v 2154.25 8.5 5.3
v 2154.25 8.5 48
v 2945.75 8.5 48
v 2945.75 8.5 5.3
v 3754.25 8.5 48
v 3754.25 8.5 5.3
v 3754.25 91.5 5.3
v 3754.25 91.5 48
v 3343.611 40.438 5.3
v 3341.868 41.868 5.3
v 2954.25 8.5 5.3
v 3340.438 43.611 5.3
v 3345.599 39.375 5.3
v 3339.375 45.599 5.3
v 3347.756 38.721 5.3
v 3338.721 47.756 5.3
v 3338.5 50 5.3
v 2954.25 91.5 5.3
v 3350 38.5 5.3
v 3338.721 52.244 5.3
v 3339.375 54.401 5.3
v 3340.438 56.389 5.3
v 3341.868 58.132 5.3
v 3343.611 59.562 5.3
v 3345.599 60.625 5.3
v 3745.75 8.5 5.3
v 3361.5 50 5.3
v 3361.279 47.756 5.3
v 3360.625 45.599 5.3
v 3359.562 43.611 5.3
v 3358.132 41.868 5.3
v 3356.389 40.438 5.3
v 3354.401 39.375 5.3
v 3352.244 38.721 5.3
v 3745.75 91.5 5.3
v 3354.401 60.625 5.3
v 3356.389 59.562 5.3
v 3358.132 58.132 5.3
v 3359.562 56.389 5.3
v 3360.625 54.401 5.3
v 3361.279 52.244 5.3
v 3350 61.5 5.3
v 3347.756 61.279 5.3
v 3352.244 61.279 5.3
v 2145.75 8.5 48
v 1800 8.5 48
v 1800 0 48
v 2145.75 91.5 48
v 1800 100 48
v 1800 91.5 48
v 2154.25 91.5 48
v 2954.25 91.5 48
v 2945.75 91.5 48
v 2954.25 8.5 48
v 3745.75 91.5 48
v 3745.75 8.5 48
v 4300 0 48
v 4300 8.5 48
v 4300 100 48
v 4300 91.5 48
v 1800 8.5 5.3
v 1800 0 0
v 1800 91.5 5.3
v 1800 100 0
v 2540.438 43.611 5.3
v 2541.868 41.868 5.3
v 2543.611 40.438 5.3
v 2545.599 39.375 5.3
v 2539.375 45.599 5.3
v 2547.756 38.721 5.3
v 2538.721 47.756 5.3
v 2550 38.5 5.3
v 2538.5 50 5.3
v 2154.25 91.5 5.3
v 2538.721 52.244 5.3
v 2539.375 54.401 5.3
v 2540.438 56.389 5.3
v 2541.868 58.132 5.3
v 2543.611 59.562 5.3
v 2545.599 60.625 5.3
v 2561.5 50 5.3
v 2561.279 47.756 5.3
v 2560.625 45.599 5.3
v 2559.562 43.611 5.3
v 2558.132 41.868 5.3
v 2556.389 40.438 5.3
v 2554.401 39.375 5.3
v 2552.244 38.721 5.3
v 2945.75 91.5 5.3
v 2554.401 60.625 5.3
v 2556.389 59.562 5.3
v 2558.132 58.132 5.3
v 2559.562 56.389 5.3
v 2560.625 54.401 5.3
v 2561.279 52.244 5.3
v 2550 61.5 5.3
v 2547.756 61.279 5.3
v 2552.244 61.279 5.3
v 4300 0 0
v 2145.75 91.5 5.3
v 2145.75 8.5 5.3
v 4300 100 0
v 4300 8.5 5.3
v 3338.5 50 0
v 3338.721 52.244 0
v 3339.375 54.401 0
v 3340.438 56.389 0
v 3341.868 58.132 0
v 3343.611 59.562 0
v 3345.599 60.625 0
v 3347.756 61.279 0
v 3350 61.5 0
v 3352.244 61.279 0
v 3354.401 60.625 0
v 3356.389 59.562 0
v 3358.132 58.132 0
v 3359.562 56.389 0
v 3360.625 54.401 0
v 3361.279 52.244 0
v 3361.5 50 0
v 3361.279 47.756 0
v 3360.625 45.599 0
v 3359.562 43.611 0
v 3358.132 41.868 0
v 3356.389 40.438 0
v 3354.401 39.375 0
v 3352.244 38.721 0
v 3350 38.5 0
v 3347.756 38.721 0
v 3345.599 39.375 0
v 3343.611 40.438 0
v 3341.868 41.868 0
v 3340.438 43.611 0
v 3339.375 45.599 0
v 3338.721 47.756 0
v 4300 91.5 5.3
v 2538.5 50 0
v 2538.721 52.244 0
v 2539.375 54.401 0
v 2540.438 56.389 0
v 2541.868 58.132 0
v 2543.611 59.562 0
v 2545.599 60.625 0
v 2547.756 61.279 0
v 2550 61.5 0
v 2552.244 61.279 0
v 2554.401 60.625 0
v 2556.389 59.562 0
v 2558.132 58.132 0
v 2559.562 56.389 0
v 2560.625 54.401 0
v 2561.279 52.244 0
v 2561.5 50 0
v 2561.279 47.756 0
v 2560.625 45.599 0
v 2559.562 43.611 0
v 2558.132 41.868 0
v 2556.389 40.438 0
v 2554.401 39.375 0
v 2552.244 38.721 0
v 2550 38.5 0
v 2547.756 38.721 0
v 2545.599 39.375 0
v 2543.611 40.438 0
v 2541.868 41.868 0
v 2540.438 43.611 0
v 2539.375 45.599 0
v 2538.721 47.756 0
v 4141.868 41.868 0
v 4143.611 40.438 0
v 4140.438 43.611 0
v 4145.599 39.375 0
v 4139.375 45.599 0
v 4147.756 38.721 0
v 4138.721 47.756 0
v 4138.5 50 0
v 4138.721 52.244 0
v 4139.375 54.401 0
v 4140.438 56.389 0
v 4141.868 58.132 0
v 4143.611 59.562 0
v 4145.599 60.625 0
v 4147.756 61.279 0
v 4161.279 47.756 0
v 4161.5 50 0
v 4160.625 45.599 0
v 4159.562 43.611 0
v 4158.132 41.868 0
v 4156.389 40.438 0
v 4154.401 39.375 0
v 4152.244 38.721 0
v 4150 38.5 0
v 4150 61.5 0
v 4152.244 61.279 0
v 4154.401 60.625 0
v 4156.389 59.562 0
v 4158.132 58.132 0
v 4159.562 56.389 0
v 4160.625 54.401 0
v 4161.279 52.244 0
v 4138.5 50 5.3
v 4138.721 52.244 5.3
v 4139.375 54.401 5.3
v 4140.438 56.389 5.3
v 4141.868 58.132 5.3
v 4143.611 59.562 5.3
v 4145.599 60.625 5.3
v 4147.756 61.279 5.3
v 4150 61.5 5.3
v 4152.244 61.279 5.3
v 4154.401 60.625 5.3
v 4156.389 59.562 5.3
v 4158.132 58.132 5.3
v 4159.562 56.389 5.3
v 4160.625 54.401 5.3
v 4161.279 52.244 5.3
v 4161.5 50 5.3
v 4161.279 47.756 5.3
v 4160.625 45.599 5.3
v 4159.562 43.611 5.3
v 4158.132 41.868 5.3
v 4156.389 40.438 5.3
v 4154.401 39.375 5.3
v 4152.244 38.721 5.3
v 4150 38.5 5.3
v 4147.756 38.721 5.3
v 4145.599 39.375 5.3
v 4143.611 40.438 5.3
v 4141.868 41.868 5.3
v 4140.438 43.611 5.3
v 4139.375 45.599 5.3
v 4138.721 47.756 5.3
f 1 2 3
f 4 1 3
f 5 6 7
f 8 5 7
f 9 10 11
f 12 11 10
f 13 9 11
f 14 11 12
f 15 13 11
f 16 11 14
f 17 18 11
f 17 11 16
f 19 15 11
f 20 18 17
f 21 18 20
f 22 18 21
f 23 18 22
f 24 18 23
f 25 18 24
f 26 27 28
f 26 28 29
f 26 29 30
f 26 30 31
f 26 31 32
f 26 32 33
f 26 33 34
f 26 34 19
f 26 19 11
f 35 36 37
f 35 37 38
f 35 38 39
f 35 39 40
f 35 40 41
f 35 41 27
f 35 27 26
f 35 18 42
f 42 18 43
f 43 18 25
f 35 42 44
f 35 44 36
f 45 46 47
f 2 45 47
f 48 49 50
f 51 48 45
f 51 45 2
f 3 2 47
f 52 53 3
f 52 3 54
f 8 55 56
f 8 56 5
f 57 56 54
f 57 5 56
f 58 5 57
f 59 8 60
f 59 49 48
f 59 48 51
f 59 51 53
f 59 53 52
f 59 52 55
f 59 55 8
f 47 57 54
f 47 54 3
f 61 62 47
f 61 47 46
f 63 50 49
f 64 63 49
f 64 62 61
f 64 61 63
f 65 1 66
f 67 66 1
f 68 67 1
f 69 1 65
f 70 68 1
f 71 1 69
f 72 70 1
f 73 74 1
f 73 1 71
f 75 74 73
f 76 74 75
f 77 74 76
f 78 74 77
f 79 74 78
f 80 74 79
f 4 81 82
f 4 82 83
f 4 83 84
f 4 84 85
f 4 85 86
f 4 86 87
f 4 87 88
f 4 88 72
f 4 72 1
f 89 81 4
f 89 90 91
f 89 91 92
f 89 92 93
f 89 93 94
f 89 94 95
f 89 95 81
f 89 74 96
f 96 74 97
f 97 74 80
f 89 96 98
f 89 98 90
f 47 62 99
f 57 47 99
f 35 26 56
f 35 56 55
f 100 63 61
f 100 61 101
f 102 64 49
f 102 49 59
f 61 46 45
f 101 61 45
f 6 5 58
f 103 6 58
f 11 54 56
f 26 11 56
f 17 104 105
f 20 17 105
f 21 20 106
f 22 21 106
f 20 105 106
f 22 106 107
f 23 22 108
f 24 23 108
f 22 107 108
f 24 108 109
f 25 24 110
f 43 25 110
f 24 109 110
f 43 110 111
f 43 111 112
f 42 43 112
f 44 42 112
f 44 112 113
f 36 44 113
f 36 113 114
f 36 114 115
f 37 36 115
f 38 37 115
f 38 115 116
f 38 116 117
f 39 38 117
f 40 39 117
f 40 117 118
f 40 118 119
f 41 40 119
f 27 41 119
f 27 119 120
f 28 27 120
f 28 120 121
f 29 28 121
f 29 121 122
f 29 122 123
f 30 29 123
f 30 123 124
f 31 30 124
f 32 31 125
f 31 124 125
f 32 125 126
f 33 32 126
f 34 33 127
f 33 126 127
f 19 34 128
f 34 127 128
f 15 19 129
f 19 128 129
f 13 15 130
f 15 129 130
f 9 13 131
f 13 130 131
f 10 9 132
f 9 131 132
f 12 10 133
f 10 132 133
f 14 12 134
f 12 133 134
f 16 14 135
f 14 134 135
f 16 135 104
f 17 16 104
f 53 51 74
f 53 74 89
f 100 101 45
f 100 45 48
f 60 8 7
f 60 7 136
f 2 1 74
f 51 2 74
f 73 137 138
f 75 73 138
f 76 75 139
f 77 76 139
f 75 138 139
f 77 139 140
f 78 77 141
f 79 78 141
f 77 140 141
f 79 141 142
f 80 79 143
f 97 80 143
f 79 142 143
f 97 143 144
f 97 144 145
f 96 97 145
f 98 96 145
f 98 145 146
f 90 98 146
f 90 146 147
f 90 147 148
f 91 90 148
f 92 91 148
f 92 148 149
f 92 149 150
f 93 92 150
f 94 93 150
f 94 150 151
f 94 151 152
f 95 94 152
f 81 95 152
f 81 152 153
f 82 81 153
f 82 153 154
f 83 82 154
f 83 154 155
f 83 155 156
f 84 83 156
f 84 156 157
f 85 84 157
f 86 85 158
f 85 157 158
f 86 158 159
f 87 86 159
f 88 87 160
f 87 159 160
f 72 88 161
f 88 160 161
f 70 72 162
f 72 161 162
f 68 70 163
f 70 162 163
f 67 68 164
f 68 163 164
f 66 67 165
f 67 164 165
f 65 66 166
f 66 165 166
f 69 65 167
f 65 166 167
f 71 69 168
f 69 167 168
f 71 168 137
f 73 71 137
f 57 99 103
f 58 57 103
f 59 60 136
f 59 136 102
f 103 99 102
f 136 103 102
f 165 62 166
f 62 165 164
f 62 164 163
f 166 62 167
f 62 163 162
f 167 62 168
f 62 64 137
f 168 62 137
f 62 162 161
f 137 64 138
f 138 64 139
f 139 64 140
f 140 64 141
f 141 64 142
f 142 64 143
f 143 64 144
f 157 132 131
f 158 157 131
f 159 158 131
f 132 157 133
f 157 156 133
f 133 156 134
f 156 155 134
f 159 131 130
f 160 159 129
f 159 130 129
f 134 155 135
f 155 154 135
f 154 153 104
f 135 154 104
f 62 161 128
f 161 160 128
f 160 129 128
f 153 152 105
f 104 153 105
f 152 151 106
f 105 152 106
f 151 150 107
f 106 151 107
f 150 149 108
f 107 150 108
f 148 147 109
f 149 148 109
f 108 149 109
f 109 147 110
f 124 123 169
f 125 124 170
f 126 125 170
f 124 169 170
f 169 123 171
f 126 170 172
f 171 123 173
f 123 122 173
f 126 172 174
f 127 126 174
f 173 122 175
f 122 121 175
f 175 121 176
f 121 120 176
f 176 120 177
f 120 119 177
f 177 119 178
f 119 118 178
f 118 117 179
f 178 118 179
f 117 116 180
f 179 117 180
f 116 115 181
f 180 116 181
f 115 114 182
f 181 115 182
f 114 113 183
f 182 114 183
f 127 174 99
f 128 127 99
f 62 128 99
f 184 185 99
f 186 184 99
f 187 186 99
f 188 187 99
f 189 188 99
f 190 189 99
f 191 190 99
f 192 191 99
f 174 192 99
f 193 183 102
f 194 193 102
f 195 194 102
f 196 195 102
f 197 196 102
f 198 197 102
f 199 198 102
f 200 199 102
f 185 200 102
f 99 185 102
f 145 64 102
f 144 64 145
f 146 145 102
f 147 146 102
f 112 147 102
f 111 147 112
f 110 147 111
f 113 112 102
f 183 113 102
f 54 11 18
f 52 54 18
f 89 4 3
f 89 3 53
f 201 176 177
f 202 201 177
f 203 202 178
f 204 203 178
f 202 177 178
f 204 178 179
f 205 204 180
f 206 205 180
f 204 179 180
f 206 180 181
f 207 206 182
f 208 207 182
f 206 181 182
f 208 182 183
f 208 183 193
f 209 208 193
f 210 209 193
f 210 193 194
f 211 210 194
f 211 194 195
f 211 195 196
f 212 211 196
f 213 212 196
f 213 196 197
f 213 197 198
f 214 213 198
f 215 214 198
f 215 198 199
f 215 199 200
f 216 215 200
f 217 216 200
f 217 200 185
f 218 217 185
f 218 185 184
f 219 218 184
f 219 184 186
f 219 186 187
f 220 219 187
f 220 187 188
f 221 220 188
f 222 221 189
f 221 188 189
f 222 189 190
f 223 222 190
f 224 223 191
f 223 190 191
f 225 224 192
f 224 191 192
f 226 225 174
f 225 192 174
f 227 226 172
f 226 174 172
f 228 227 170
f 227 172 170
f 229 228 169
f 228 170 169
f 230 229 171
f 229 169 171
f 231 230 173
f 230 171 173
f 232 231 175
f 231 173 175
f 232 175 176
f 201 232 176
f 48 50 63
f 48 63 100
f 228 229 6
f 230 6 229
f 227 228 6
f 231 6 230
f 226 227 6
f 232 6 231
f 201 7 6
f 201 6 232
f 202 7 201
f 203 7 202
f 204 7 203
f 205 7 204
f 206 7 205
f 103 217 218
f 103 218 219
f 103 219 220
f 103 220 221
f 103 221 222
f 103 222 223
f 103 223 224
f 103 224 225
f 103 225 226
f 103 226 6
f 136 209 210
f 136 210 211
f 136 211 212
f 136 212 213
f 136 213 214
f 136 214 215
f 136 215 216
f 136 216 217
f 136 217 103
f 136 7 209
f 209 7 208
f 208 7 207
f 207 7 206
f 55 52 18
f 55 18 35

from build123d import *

# Parameters (mm, degrees)
SKETCH_1_W             = 4300
SKETCH_1_H             = 100
EXTRUDE_1_DEPTH        = 48
SKETCH_2_W             = 4300
SKETCH_2_H             = 83
CUT_EXTRUDE_2_DEPTH    = 42.7
SKETCH_3_W             = 8.5
SKETCH_3_H             = 83
EXTRUDE_3_DEPTH        = 42.7
PATTERN_LINEAR_1_COUNT = 5
PATTERN_LINEAR_1_PITCH = 800
SKETCH_4_R             = 11.5
CUT_EXTRUDE_4_DEPTH    = 4302.430459742
PATTERN_LINEAR_2_COUNT = 6
PATTERN_LINEAR_2_PITCH = 800
SKETCH_5_W             = 1800
SKETCH_5_H             = 100
CUT_EXTRUDE_1_DEPTH    = 48


with BuildPart() as part:
    # 草图1 → 拉伸1 (new body)
    with BuildSketch(Plane.XY):
        with Locations((2150, 50)):
            Rectangle(SKETCH_1_W, SKETCH_1_H)
    extrude(amount=EXTRUDE_1_DEPTH)

    # 草图2 → 拉伸2 (cut)
    with BuildSketch(Plane.XY.offset(48)):
        with Locations((2150, 50)):
            Rectangle(SKETCH_2_W, SKETCH_2_H)
    extrude(amount=-CUT_EXTRUDE_2_DEPTH, mode=Mode.SUBTRACT)

    # 草图3 → 拉伸3 (add)
    with BuildSketch(Plane.XY.offset(5.3)):
        with Locations((550, 50)):
            Rectangle(SKETCH_3_W, SKETCH_3_H)
    extrude_3 = extrude(amount=EXTRUDE_3_DEPTH)

    # 阵列(线性)1: 拉伸3 ×5
    with Locations(*[(i * PATTERN_LINEAR_1_PITCH, 0, 0) for i in range(1, PATTERN_LINEAR_1_COUNT)]):
        add(extrude_3)

    # 草图4 → 拉伸4 (cut, through all)
    with BuildSketch(Plane(origin=(0, 0, 0), x_dir=(-1, 0, 0), z_dir=(0, 0, -1))):
        with Locations((-4150, 50)):
            Circle(SKETCH_4_R)
    cut_extrude_4 = extrude(amount=-CUT_EXTRUDE_4_DEPTH, mode=Mode.SUBTRACT)

    # 阵列(线性)2: 拉伸4 ×6
    with Locations(*[(-i * PATTERN_LINEAR_2_PITCH, 0, 0) for i in range(1, PATTERN_LINEAR_2_COUNT)]):
        add(cut_extrude_4, mode=Mode.SUBTRACT)

    # 草图5 → 切除-拉伸1 (cut)
    with BuildSketch(Plane(origin=(0, 0, 0), x_dir=(-1, 0, 0), z_dir=(0, 0, -1))):
        with Locations((-900, 50)):
            Rectangle(SKETCH_5_W, SKETCH_5_H)
    extrude(amount=-CUT_EXTRUDE_1_DEPTH, mode=Mode.SUBTRACT)


solid = part.part
